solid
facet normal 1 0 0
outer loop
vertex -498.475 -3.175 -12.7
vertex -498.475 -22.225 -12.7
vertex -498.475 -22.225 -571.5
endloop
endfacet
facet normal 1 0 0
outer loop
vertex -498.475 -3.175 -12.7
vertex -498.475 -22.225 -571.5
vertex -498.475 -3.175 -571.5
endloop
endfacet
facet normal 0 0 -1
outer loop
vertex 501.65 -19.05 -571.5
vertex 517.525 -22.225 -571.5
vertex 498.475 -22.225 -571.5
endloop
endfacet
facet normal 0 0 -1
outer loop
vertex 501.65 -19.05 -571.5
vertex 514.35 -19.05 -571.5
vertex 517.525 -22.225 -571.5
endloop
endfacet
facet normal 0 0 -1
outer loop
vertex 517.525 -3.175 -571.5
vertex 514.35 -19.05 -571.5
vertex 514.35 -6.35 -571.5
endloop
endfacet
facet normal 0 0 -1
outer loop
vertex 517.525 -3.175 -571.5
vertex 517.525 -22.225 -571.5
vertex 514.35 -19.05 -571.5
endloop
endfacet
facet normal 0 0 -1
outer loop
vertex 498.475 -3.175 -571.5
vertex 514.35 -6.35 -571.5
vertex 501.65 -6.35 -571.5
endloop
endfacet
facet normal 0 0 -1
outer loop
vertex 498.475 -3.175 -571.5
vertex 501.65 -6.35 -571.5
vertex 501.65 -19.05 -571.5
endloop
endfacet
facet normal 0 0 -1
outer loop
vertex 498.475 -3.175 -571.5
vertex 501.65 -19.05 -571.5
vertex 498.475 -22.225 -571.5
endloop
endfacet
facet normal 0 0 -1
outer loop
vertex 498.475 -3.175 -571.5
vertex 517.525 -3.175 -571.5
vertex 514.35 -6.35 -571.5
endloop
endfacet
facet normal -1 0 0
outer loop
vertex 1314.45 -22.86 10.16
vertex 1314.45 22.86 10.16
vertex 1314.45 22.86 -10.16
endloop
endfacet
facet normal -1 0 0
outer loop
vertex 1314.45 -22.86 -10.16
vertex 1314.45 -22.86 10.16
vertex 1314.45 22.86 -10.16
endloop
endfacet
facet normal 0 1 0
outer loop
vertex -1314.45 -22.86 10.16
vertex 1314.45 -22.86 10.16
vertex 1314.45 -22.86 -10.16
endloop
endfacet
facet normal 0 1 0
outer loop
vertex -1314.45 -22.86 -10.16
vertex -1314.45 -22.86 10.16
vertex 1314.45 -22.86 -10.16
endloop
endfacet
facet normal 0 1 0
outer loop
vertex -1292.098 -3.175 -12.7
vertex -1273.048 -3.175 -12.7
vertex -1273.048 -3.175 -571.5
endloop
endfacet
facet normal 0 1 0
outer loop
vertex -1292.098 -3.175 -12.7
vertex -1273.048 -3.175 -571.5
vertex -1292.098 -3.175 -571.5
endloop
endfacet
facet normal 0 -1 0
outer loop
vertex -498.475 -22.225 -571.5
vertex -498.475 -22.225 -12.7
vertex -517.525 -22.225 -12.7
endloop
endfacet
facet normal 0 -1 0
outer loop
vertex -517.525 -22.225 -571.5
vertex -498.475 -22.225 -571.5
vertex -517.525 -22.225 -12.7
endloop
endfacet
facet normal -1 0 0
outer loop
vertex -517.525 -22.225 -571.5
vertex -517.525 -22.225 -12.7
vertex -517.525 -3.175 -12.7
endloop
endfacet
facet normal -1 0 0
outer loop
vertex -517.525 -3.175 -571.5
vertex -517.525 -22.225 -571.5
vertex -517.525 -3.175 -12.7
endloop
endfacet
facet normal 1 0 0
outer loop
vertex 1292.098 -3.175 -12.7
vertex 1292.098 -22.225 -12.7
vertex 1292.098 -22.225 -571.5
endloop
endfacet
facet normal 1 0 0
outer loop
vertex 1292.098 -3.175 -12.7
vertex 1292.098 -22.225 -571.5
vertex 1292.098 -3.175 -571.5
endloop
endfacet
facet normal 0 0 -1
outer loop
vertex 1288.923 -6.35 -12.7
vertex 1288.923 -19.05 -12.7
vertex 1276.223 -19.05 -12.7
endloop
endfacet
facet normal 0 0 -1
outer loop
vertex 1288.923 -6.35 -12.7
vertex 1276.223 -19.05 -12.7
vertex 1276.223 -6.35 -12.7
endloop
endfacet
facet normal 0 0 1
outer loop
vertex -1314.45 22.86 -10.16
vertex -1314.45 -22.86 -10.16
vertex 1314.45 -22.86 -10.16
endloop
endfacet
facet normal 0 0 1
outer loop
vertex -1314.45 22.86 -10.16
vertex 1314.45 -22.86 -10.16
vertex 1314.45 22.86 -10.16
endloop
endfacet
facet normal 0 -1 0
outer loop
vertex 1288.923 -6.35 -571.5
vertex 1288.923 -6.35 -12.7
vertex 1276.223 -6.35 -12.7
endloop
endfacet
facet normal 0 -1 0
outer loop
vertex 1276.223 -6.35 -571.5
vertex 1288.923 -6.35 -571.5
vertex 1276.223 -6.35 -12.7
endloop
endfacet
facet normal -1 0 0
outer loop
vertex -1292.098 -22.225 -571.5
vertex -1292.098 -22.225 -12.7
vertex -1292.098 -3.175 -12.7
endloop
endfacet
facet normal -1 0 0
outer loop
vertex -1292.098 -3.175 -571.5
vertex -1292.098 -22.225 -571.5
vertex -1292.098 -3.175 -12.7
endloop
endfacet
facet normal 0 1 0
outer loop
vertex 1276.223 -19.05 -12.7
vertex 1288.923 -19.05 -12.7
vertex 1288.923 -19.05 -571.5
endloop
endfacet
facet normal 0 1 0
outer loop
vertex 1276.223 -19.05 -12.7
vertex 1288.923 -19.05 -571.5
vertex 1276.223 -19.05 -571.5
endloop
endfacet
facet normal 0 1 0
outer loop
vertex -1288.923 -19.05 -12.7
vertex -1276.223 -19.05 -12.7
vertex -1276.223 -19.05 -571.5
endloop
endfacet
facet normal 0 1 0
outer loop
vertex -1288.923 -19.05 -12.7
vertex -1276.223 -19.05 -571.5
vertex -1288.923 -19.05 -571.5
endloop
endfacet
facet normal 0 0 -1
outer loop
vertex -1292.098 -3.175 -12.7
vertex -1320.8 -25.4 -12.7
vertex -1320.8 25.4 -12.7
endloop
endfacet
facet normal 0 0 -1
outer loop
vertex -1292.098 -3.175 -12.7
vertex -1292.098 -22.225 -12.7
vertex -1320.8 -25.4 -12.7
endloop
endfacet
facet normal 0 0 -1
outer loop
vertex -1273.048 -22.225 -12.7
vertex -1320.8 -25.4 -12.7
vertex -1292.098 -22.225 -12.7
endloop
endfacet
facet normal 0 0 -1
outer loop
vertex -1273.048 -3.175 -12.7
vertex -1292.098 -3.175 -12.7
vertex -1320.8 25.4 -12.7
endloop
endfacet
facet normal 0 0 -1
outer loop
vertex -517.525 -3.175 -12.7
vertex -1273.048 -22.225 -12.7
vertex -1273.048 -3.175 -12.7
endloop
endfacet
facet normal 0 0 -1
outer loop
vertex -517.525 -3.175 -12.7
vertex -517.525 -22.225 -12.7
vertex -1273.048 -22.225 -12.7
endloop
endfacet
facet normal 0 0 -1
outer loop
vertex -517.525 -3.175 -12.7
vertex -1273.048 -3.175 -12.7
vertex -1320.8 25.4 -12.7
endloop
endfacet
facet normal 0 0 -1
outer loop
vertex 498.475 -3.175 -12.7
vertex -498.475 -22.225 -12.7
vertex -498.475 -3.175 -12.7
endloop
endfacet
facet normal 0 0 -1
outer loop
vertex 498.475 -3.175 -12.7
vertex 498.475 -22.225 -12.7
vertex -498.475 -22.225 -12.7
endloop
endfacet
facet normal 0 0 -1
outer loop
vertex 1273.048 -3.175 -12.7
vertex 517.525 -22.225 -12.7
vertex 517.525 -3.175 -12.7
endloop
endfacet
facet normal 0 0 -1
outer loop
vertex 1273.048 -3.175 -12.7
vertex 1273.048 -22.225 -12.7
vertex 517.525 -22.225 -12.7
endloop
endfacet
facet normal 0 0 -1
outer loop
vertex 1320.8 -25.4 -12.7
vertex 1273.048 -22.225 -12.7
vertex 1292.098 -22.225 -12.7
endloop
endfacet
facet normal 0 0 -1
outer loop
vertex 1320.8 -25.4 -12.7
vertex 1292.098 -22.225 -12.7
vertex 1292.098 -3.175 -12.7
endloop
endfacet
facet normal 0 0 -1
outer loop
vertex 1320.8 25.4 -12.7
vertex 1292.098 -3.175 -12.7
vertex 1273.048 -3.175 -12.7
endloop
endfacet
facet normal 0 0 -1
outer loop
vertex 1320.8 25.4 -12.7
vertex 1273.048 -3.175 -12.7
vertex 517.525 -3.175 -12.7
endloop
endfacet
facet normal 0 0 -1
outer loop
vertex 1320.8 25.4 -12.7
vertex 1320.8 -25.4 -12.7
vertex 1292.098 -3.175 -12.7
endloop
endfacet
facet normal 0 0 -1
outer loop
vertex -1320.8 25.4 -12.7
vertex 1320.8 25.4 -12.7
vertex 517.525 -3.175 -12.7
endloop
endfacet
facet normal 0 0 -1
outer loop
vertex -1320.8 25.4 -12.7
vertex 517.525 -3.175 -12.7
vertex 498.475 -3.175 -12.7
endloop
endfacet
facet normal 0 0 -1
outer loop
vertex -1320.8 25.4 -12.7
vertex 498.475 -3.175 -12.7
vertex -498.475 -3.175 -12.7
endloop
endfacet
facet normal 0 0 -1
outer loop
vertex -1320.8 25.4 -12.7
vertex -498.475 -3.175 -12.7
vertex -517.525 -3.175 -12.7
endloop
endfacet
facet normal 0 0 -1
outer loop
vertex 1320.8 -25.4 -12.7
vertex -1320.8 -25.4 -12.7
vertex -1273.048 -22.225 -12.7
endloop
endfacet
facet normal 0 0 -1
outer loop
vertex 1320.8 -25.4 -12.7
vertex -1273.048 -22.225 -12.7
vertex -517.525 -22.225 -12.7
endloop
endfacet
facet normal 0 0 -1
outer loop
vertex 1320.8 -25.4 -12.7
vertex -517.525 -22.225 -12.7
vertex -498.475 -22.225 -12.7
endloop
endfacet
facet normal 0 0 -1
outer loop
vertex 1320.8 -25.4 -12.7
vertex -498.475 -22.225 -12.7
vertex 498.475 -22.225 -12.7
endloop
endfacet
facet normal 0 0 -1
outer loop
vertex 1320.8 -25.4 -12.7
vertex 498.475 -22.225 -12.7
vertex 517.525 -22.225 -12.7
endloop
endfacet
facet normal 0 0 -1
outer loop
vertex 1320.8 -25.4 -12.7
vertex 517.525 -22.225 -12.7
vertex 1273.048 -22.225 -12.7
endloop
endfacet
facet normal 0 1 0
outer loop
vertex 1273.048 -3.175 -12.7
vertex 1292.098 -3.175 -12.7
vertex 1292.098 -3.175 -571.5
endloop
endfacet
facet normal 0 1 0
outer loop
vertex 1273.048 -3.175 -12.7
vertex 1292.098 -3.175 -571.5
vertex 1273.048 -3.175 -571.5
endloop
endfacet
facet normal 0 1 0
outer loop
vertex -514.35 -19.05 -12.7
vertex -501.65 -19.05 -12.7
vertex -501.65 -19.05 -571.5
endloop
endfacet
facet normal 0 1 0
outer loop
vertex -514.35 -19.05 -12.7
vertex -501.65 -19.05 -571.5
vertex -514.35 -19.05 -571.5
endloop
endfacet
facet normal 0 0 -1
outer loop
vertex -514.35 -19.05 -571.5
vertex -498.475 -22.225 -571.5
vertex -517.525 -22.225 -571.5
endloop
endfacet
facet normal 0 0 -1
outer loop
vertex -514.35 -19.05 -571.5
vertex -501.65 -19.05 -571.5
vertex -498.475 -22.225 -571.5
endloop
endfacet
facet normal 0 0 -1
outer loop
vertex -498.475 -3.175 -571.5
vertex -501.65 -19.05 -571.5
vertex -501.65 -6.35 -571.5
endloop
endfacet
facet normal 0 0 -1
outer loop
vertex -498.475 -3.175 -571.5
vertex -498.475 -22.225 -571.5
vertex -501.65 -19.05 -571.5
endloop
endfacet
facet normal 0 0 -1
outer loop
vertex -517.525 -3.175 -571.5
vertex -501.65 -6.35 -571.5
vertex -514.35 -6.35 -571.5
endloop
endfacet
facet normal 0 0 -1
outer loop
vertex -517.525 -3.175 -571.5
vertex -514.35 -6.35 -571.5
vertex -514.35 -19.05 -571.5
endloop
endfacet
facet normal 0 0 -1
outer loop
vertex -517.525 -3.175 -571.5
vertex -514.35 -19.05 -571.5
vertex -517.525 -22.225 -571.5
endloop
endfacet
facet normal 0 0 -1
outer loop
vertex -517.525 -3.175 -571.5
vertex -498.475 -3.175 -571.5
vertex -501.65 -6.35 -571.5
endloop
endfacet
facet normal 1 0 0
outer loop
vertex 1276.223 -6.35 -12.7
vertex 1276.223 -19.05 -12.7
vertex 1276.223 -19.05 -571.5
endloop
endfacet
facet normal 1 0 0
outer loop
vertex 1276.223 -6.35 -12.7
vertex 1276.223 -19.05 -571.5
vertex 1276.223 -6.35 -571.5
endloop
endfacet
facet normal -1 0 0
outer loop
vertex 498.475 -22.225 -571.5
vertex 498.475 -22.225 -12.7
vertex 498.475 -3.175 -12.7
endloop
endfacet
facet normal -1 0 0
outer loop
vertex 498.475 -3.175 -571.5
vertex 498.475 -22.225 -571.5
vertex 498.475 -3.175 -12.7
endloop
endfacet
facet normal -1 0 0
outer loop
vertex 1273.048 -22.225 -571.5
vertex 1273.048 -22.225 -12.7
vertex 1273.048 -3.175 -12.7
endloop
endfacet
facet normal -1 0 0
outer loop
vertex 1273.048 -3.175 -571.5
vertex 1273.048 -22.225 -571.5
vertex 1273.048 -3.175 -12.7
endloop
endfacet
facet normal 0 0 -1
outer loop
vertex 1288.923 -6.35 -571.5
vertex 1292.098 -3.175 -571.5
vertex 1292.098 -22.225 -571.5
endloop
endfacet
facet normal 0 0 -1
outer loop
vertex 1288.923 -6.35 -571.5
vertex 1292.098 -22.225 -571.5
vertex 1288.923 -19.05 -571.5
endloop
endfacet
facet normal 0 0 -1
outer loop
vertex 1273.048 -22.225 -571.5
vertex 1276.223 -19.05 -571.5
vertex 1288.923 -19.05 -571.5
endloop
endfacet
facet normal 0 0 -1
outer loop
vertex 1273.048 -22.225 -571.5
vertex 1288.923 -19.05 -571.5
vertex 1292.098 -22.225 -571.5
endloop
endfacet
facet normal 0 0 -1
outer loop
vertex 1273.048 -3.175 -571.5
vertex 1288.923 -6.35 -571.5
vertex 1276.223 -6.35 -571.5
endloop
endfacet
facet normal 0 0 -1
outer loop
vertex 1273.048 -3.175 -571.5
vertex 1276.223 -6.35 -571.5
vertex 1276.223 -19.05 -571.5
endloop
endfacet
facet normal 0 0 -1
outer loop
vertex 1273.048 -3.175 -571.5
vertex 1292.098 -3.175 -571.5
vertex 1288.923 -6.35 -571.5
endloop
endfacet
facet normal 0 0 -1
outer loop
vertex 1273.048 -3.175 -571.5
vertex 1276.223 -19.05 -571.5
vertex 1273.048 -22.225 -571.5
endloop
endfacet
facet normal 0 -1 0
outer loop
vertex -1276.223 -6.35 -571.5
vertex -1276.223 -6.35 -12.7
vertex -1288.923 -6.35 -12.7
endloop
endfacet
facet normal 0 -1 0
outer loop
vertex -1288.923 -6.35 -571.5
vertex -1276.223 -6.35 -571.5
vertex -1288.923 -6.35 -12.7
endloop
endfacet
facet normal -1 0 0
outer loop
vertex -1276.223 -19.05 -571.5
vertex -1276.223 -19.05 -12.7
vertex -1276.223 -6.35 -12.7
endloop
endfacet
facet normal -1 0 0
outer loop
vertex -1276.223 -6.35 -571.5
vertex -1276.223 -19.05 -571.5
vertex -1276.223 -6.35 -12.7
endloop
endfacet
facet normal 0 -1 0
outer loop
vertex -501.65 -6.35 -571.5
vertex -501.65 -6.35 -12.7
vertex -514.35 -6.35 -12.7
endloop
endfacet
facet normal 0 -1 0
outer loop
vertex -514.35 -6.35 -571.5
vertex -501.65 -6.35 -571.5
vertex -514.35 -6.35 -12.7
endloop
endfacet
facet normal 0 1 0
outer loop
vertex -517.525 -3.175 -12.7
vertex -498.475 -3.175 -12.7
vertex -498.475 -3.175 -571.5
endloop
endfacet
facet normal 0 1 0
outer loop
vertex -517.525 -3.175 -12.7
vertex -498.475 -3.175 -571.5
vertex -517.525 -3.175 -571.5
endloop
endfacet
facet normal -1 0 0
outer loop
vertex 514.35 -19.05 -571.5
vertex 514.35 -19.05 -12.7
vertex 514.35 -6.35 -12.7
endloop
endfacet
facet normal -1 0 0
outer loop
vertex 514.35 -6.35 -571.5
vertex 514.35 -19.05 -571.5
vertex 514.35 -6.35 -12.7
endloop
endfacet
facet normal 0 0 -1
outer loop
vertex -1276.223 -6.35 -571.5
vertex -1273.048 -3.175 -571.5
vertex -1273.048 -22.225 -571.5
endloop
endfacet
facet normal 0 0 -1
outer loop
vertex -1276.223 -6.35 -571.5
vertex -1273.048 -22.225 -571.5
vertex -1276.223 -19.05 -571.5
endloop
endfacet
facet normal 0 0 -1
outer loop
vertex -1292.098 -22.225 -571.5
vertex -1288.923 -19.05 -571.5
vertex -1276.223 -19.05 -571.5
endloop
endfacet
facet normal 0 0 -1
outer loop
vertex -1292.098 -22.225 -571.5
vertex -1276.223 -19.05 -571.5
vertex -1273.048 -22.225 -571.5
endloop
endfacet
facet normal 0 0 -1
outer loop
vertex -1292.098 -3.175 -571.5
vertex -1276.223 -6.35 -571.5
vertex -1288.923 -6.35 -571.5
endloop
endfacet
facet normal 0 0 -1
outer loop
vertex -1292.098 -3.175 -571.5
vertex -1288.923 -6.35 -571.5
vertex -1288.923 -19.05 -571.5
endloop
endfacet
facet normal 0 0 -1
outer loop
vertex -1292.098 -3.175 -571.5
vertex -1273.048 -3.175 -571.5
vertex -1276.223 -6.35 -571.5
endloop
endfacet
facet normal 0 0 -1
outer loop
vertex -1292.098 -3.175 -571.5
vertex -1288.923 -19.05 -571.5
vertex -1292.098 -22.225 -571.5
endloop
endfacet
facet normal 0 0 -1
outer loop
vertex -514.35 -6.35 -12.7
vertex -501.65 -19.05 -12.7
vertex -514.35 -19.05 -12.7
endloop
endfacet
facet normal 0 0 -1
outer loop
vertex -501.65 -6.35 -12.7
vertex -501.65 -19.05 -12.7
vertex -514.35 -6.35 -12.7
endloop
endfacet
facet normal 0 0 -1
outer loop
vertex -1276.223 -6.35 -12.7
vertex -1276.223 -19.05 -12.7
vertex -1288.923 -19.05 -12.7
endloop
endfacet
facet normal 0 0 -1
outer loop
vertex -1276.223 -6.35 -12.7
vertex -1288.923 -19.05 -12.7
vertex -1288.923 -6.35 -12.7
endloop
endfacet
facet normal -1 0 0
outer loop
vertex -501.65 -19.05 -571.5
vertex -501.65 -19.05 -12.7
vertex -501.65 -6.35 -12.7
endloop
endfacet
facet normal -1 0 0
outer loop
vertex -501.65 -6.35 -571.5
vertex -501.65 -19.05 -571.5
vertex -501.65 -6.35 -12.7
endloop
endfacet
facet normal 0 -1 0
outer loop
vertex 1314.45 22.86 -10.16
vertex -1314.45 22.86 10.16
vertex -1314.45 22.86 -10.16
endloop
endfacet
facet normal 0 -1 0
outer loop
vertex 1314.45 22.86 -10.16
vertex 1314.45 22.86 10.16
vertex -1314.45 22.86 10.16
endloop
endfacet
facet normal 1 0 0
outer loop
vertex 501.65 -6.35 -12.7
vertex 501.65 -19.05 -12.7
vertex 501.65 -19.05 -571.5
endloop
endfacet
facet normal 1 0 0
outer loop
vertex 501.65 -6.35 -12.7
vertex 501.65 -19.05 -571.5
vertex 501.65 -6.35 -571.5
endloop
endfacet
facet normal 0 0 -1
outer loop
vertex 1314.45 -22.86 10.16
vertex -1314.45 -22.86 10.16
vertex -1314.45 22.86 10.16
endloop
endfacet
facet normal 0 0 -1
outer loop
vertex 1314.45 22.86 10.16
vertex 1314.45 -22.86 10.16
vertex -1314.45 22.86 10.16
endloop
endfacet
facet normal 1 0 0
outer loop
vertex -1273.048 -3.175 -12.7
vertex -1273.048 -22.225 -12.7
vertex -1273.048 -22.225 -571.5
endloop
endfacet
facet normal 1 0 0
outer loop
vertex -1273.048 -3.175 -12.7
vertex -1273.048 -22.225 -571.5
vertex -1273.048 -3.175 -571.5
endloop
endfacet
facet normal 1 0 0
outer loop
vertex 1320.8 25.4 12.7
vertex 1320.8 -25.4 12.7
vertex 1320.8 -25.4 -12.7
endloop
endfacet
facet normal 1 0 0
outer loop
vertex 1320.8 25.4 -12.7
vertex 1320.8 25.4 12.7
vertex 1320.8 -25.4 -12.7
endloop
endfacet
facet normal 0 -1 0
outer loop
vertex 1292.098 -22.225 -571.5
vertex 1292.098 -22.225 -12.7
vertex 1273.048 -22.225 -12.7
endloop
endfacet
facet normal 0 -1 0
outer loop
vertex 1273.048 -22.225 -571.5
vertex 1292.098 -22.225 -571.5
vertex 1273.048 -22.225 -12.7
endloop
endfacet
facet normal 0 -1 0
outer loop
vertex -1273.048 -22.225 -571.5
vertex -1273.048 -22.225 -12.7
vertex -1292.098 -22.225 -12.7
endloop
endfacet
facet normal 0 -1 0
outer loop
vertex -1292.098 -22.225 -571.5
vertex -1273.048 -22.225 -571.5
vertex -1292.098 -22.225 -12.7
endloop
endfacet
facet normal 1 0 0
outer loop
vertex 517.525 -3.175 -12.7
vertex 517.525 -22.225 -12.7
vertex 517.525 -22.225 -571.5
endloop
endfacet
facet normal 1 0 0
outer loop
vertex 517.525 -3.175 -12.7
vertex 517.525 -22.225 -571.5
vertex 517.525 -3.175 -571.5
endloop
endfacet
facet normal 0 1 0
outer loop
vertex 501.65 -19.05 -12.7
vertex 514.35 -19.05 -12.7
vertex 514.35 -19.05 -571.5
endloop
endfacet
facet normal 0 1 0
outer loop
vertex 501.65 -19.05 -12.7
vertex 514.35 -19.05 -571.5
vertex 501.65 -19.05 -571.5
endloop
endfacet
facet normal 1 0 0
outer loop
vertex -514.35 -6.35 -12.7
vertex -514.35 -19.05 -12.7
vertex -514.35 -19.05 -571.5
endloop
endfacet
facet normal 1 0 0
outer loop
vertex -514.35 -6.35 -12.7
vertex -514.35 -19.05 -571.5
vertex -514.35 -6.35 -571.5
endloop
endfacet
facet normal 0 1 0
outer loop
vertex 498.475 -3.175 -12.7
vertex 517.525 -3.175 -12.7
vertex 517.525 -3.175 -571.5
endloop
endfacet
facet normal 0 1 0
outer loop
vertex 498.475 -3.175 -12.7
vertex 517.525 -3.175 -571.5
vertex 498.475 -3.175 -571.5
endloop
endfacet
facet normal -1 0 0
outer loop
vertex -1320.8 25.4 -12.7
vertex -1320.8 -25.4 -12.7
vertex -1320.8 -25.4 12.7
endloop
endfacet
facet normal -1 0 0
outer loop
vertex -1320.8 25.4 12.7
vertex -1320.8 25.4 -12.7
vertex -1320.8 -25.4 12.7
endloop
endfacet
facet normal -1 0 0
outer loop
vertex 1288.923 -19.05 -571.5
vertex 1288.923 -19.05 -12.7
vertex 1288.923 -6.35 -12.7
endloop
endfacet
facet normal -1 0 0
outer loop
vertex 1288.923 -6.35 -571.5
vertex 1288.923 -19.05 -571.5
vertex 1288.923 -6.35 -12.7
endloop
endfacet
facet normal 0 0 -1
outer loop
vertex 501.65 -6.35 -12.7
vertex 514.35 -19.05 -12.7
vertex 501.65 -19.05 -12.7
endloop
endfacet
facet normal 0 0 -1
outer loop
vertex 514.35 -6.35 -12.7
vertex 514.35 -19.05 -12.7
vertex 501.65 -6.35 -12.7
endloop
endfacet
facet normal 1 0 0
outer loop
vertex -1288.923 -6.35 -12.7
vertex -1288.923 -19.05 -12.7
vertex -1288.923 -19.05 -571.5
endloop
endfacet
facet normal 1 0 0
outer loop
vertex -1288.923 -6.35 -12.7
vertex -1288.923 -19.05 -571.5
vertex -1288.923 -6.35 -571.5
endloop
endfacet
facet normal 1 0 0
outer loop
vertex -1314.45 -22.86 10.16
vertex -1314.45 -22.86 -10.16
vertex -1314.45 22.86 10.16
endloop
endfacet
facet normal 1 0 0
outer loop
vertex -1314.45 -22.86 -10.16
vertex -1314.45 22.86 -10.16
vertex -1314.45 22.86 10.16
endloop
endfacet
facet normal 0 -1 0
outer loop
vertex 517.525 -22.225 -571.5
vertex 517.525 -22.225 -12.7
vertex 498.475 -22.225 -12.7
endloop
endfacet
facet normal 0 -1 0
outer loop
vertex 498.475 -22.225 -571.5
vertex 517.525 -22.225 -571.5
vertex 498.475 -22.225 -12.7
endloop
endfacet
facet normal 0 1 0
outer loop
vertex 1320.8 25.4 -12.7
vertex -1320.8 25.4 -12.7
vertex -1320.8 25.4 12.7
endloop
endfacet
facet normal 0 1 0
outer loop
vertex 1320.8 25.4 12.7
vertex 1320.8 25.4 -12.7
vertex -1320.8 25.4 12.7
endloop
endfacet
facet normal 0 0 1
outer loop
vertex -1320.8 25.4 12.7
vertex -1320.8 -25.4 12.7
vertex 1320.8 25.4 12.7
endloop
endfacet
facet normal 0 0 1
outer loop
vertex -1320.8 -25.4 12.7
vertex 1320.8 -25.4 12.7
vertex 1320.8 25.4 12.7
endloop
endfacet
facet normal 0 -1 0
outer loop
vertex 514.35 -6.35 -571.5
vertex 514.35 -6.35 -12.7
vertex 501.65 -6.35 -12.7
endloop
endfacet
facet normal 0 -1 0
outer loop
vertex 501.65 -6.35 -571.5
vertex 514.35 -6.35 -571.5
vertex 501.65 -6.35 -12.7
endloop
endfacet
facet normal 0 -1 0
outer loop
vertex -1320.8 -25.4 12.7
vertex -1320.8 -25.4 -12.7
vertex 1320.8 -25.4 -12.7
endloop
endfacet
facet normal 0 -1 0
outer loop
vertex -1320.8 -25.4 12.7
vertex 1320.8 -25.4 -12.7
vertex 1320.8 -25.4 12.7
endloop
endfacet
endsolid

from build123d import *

# Parameters (mm, degrees)
SKETCH1_W           = 25.4
SKETCH1_H           = 50.8
SKETCH1_W_2         = 20.32
SKETCH1_H_2         = 45.72
BOSS_EXTRUDE1_DEPTH = 1314.45
SKETCH2_W           = 25.4
SKETCH2_H           = 50.8
BOSS_EXTRUDE2_DEPTH = 6.35
SKETCH3_W           = 25.4
SKETCH3_H           = 50.8
BOSS_EXTRUDE3_DEPTH = 6.35
SKETCH4_W           = 19.05
SKETCH4_H           = 19.05
SKETCH4_W_2         = 12.7
SKETCH4_H_2         = 12.7
BOSS_EXTRUDE4_DEPTH = 558.8


with BuildPart() as part:
    # Sketch1 → Boss-Extrude1 (new body, symmetric)
    with BuildSketch(Plane(origin=(0, 0, 0), x_dir=(0, 0, -1), z_dir=(1, 0, 0))):
        Rectangle(SKETCH1_W, SKETCH1_H)
        Rectangle(SKETCH1_W_2, SKETCH1_H_2, mode=Mode.SUBTRACT)
    extrude(amount=BOSS_EXTRUDE1_DEPTH, both=True)

    # Sketch2 → Boss-Extrude2 (add)
    with BuildSketch(Plane(origin=(1314.45, 0, 0), x_dir=(0, 0, -1), z_dir=(1, 0, 0))):
        Rectangle(SKETCH2_W, SKETCH2_H)
    extrude(amount=BOSS_EXTRUDE2_DEPTH)

    # Sketch3 → Boss-Extrude3 (add)
    with BuildSketch(Plane.ZY.offset(1314.45)):
        Rectangle(SKETCH3_W, SKETCH3_H)
    extrude(amount=BOSS_EXTRUDE3_DEPTH)

    # Sketch4 → Boss-Extrude4 (add)
    with BuildSketch(Plane(origin=(0, 0, -12.7), x_dir=(-1, 0, 0), z_dir=(0, 0, -1))):
        with Locations((-1282.573, -12.7)):
            Rectangle(SKETCH4_W, SKETCH4_H)
        with Locations((-1282.573, -12.7)):
            Rectangle(SKETCH4_W_2, SKETCH4_H_2, mode=Mode.SUBTRACT)
        with Locations((-508, -12.7)):
            Rectangle(SKETCH4_W, SKETCH4_H)
        with Locations((-508, -12.7)):
            Rectangle(SKETCH4_W_2, SKETCH4_H_2, mode=Mode.SUBTRACT)
        with Locations((1282.573, -12.7)):
            Rectangle(SKETCH4_W, SKETCH4_H)
        with Locations((1282.573, -12.7)):
            Rectangle(SKETCH4_W_2, SKETCH4_H_2, mode=Mode.SUBTRACT)
        with Locations((508, -12.7)):
            Rectangle(SKETCH4_W, SKETCH4_H)
        with Locations((508, -12.7)):
            Rectangle(SKETCH4_W_2, SKETCH4_H_2, mode=Mode.SUBTRACT)
    extrude(amount=BOSS_EXTRUDE4_DEPTH)


solid = part.part
